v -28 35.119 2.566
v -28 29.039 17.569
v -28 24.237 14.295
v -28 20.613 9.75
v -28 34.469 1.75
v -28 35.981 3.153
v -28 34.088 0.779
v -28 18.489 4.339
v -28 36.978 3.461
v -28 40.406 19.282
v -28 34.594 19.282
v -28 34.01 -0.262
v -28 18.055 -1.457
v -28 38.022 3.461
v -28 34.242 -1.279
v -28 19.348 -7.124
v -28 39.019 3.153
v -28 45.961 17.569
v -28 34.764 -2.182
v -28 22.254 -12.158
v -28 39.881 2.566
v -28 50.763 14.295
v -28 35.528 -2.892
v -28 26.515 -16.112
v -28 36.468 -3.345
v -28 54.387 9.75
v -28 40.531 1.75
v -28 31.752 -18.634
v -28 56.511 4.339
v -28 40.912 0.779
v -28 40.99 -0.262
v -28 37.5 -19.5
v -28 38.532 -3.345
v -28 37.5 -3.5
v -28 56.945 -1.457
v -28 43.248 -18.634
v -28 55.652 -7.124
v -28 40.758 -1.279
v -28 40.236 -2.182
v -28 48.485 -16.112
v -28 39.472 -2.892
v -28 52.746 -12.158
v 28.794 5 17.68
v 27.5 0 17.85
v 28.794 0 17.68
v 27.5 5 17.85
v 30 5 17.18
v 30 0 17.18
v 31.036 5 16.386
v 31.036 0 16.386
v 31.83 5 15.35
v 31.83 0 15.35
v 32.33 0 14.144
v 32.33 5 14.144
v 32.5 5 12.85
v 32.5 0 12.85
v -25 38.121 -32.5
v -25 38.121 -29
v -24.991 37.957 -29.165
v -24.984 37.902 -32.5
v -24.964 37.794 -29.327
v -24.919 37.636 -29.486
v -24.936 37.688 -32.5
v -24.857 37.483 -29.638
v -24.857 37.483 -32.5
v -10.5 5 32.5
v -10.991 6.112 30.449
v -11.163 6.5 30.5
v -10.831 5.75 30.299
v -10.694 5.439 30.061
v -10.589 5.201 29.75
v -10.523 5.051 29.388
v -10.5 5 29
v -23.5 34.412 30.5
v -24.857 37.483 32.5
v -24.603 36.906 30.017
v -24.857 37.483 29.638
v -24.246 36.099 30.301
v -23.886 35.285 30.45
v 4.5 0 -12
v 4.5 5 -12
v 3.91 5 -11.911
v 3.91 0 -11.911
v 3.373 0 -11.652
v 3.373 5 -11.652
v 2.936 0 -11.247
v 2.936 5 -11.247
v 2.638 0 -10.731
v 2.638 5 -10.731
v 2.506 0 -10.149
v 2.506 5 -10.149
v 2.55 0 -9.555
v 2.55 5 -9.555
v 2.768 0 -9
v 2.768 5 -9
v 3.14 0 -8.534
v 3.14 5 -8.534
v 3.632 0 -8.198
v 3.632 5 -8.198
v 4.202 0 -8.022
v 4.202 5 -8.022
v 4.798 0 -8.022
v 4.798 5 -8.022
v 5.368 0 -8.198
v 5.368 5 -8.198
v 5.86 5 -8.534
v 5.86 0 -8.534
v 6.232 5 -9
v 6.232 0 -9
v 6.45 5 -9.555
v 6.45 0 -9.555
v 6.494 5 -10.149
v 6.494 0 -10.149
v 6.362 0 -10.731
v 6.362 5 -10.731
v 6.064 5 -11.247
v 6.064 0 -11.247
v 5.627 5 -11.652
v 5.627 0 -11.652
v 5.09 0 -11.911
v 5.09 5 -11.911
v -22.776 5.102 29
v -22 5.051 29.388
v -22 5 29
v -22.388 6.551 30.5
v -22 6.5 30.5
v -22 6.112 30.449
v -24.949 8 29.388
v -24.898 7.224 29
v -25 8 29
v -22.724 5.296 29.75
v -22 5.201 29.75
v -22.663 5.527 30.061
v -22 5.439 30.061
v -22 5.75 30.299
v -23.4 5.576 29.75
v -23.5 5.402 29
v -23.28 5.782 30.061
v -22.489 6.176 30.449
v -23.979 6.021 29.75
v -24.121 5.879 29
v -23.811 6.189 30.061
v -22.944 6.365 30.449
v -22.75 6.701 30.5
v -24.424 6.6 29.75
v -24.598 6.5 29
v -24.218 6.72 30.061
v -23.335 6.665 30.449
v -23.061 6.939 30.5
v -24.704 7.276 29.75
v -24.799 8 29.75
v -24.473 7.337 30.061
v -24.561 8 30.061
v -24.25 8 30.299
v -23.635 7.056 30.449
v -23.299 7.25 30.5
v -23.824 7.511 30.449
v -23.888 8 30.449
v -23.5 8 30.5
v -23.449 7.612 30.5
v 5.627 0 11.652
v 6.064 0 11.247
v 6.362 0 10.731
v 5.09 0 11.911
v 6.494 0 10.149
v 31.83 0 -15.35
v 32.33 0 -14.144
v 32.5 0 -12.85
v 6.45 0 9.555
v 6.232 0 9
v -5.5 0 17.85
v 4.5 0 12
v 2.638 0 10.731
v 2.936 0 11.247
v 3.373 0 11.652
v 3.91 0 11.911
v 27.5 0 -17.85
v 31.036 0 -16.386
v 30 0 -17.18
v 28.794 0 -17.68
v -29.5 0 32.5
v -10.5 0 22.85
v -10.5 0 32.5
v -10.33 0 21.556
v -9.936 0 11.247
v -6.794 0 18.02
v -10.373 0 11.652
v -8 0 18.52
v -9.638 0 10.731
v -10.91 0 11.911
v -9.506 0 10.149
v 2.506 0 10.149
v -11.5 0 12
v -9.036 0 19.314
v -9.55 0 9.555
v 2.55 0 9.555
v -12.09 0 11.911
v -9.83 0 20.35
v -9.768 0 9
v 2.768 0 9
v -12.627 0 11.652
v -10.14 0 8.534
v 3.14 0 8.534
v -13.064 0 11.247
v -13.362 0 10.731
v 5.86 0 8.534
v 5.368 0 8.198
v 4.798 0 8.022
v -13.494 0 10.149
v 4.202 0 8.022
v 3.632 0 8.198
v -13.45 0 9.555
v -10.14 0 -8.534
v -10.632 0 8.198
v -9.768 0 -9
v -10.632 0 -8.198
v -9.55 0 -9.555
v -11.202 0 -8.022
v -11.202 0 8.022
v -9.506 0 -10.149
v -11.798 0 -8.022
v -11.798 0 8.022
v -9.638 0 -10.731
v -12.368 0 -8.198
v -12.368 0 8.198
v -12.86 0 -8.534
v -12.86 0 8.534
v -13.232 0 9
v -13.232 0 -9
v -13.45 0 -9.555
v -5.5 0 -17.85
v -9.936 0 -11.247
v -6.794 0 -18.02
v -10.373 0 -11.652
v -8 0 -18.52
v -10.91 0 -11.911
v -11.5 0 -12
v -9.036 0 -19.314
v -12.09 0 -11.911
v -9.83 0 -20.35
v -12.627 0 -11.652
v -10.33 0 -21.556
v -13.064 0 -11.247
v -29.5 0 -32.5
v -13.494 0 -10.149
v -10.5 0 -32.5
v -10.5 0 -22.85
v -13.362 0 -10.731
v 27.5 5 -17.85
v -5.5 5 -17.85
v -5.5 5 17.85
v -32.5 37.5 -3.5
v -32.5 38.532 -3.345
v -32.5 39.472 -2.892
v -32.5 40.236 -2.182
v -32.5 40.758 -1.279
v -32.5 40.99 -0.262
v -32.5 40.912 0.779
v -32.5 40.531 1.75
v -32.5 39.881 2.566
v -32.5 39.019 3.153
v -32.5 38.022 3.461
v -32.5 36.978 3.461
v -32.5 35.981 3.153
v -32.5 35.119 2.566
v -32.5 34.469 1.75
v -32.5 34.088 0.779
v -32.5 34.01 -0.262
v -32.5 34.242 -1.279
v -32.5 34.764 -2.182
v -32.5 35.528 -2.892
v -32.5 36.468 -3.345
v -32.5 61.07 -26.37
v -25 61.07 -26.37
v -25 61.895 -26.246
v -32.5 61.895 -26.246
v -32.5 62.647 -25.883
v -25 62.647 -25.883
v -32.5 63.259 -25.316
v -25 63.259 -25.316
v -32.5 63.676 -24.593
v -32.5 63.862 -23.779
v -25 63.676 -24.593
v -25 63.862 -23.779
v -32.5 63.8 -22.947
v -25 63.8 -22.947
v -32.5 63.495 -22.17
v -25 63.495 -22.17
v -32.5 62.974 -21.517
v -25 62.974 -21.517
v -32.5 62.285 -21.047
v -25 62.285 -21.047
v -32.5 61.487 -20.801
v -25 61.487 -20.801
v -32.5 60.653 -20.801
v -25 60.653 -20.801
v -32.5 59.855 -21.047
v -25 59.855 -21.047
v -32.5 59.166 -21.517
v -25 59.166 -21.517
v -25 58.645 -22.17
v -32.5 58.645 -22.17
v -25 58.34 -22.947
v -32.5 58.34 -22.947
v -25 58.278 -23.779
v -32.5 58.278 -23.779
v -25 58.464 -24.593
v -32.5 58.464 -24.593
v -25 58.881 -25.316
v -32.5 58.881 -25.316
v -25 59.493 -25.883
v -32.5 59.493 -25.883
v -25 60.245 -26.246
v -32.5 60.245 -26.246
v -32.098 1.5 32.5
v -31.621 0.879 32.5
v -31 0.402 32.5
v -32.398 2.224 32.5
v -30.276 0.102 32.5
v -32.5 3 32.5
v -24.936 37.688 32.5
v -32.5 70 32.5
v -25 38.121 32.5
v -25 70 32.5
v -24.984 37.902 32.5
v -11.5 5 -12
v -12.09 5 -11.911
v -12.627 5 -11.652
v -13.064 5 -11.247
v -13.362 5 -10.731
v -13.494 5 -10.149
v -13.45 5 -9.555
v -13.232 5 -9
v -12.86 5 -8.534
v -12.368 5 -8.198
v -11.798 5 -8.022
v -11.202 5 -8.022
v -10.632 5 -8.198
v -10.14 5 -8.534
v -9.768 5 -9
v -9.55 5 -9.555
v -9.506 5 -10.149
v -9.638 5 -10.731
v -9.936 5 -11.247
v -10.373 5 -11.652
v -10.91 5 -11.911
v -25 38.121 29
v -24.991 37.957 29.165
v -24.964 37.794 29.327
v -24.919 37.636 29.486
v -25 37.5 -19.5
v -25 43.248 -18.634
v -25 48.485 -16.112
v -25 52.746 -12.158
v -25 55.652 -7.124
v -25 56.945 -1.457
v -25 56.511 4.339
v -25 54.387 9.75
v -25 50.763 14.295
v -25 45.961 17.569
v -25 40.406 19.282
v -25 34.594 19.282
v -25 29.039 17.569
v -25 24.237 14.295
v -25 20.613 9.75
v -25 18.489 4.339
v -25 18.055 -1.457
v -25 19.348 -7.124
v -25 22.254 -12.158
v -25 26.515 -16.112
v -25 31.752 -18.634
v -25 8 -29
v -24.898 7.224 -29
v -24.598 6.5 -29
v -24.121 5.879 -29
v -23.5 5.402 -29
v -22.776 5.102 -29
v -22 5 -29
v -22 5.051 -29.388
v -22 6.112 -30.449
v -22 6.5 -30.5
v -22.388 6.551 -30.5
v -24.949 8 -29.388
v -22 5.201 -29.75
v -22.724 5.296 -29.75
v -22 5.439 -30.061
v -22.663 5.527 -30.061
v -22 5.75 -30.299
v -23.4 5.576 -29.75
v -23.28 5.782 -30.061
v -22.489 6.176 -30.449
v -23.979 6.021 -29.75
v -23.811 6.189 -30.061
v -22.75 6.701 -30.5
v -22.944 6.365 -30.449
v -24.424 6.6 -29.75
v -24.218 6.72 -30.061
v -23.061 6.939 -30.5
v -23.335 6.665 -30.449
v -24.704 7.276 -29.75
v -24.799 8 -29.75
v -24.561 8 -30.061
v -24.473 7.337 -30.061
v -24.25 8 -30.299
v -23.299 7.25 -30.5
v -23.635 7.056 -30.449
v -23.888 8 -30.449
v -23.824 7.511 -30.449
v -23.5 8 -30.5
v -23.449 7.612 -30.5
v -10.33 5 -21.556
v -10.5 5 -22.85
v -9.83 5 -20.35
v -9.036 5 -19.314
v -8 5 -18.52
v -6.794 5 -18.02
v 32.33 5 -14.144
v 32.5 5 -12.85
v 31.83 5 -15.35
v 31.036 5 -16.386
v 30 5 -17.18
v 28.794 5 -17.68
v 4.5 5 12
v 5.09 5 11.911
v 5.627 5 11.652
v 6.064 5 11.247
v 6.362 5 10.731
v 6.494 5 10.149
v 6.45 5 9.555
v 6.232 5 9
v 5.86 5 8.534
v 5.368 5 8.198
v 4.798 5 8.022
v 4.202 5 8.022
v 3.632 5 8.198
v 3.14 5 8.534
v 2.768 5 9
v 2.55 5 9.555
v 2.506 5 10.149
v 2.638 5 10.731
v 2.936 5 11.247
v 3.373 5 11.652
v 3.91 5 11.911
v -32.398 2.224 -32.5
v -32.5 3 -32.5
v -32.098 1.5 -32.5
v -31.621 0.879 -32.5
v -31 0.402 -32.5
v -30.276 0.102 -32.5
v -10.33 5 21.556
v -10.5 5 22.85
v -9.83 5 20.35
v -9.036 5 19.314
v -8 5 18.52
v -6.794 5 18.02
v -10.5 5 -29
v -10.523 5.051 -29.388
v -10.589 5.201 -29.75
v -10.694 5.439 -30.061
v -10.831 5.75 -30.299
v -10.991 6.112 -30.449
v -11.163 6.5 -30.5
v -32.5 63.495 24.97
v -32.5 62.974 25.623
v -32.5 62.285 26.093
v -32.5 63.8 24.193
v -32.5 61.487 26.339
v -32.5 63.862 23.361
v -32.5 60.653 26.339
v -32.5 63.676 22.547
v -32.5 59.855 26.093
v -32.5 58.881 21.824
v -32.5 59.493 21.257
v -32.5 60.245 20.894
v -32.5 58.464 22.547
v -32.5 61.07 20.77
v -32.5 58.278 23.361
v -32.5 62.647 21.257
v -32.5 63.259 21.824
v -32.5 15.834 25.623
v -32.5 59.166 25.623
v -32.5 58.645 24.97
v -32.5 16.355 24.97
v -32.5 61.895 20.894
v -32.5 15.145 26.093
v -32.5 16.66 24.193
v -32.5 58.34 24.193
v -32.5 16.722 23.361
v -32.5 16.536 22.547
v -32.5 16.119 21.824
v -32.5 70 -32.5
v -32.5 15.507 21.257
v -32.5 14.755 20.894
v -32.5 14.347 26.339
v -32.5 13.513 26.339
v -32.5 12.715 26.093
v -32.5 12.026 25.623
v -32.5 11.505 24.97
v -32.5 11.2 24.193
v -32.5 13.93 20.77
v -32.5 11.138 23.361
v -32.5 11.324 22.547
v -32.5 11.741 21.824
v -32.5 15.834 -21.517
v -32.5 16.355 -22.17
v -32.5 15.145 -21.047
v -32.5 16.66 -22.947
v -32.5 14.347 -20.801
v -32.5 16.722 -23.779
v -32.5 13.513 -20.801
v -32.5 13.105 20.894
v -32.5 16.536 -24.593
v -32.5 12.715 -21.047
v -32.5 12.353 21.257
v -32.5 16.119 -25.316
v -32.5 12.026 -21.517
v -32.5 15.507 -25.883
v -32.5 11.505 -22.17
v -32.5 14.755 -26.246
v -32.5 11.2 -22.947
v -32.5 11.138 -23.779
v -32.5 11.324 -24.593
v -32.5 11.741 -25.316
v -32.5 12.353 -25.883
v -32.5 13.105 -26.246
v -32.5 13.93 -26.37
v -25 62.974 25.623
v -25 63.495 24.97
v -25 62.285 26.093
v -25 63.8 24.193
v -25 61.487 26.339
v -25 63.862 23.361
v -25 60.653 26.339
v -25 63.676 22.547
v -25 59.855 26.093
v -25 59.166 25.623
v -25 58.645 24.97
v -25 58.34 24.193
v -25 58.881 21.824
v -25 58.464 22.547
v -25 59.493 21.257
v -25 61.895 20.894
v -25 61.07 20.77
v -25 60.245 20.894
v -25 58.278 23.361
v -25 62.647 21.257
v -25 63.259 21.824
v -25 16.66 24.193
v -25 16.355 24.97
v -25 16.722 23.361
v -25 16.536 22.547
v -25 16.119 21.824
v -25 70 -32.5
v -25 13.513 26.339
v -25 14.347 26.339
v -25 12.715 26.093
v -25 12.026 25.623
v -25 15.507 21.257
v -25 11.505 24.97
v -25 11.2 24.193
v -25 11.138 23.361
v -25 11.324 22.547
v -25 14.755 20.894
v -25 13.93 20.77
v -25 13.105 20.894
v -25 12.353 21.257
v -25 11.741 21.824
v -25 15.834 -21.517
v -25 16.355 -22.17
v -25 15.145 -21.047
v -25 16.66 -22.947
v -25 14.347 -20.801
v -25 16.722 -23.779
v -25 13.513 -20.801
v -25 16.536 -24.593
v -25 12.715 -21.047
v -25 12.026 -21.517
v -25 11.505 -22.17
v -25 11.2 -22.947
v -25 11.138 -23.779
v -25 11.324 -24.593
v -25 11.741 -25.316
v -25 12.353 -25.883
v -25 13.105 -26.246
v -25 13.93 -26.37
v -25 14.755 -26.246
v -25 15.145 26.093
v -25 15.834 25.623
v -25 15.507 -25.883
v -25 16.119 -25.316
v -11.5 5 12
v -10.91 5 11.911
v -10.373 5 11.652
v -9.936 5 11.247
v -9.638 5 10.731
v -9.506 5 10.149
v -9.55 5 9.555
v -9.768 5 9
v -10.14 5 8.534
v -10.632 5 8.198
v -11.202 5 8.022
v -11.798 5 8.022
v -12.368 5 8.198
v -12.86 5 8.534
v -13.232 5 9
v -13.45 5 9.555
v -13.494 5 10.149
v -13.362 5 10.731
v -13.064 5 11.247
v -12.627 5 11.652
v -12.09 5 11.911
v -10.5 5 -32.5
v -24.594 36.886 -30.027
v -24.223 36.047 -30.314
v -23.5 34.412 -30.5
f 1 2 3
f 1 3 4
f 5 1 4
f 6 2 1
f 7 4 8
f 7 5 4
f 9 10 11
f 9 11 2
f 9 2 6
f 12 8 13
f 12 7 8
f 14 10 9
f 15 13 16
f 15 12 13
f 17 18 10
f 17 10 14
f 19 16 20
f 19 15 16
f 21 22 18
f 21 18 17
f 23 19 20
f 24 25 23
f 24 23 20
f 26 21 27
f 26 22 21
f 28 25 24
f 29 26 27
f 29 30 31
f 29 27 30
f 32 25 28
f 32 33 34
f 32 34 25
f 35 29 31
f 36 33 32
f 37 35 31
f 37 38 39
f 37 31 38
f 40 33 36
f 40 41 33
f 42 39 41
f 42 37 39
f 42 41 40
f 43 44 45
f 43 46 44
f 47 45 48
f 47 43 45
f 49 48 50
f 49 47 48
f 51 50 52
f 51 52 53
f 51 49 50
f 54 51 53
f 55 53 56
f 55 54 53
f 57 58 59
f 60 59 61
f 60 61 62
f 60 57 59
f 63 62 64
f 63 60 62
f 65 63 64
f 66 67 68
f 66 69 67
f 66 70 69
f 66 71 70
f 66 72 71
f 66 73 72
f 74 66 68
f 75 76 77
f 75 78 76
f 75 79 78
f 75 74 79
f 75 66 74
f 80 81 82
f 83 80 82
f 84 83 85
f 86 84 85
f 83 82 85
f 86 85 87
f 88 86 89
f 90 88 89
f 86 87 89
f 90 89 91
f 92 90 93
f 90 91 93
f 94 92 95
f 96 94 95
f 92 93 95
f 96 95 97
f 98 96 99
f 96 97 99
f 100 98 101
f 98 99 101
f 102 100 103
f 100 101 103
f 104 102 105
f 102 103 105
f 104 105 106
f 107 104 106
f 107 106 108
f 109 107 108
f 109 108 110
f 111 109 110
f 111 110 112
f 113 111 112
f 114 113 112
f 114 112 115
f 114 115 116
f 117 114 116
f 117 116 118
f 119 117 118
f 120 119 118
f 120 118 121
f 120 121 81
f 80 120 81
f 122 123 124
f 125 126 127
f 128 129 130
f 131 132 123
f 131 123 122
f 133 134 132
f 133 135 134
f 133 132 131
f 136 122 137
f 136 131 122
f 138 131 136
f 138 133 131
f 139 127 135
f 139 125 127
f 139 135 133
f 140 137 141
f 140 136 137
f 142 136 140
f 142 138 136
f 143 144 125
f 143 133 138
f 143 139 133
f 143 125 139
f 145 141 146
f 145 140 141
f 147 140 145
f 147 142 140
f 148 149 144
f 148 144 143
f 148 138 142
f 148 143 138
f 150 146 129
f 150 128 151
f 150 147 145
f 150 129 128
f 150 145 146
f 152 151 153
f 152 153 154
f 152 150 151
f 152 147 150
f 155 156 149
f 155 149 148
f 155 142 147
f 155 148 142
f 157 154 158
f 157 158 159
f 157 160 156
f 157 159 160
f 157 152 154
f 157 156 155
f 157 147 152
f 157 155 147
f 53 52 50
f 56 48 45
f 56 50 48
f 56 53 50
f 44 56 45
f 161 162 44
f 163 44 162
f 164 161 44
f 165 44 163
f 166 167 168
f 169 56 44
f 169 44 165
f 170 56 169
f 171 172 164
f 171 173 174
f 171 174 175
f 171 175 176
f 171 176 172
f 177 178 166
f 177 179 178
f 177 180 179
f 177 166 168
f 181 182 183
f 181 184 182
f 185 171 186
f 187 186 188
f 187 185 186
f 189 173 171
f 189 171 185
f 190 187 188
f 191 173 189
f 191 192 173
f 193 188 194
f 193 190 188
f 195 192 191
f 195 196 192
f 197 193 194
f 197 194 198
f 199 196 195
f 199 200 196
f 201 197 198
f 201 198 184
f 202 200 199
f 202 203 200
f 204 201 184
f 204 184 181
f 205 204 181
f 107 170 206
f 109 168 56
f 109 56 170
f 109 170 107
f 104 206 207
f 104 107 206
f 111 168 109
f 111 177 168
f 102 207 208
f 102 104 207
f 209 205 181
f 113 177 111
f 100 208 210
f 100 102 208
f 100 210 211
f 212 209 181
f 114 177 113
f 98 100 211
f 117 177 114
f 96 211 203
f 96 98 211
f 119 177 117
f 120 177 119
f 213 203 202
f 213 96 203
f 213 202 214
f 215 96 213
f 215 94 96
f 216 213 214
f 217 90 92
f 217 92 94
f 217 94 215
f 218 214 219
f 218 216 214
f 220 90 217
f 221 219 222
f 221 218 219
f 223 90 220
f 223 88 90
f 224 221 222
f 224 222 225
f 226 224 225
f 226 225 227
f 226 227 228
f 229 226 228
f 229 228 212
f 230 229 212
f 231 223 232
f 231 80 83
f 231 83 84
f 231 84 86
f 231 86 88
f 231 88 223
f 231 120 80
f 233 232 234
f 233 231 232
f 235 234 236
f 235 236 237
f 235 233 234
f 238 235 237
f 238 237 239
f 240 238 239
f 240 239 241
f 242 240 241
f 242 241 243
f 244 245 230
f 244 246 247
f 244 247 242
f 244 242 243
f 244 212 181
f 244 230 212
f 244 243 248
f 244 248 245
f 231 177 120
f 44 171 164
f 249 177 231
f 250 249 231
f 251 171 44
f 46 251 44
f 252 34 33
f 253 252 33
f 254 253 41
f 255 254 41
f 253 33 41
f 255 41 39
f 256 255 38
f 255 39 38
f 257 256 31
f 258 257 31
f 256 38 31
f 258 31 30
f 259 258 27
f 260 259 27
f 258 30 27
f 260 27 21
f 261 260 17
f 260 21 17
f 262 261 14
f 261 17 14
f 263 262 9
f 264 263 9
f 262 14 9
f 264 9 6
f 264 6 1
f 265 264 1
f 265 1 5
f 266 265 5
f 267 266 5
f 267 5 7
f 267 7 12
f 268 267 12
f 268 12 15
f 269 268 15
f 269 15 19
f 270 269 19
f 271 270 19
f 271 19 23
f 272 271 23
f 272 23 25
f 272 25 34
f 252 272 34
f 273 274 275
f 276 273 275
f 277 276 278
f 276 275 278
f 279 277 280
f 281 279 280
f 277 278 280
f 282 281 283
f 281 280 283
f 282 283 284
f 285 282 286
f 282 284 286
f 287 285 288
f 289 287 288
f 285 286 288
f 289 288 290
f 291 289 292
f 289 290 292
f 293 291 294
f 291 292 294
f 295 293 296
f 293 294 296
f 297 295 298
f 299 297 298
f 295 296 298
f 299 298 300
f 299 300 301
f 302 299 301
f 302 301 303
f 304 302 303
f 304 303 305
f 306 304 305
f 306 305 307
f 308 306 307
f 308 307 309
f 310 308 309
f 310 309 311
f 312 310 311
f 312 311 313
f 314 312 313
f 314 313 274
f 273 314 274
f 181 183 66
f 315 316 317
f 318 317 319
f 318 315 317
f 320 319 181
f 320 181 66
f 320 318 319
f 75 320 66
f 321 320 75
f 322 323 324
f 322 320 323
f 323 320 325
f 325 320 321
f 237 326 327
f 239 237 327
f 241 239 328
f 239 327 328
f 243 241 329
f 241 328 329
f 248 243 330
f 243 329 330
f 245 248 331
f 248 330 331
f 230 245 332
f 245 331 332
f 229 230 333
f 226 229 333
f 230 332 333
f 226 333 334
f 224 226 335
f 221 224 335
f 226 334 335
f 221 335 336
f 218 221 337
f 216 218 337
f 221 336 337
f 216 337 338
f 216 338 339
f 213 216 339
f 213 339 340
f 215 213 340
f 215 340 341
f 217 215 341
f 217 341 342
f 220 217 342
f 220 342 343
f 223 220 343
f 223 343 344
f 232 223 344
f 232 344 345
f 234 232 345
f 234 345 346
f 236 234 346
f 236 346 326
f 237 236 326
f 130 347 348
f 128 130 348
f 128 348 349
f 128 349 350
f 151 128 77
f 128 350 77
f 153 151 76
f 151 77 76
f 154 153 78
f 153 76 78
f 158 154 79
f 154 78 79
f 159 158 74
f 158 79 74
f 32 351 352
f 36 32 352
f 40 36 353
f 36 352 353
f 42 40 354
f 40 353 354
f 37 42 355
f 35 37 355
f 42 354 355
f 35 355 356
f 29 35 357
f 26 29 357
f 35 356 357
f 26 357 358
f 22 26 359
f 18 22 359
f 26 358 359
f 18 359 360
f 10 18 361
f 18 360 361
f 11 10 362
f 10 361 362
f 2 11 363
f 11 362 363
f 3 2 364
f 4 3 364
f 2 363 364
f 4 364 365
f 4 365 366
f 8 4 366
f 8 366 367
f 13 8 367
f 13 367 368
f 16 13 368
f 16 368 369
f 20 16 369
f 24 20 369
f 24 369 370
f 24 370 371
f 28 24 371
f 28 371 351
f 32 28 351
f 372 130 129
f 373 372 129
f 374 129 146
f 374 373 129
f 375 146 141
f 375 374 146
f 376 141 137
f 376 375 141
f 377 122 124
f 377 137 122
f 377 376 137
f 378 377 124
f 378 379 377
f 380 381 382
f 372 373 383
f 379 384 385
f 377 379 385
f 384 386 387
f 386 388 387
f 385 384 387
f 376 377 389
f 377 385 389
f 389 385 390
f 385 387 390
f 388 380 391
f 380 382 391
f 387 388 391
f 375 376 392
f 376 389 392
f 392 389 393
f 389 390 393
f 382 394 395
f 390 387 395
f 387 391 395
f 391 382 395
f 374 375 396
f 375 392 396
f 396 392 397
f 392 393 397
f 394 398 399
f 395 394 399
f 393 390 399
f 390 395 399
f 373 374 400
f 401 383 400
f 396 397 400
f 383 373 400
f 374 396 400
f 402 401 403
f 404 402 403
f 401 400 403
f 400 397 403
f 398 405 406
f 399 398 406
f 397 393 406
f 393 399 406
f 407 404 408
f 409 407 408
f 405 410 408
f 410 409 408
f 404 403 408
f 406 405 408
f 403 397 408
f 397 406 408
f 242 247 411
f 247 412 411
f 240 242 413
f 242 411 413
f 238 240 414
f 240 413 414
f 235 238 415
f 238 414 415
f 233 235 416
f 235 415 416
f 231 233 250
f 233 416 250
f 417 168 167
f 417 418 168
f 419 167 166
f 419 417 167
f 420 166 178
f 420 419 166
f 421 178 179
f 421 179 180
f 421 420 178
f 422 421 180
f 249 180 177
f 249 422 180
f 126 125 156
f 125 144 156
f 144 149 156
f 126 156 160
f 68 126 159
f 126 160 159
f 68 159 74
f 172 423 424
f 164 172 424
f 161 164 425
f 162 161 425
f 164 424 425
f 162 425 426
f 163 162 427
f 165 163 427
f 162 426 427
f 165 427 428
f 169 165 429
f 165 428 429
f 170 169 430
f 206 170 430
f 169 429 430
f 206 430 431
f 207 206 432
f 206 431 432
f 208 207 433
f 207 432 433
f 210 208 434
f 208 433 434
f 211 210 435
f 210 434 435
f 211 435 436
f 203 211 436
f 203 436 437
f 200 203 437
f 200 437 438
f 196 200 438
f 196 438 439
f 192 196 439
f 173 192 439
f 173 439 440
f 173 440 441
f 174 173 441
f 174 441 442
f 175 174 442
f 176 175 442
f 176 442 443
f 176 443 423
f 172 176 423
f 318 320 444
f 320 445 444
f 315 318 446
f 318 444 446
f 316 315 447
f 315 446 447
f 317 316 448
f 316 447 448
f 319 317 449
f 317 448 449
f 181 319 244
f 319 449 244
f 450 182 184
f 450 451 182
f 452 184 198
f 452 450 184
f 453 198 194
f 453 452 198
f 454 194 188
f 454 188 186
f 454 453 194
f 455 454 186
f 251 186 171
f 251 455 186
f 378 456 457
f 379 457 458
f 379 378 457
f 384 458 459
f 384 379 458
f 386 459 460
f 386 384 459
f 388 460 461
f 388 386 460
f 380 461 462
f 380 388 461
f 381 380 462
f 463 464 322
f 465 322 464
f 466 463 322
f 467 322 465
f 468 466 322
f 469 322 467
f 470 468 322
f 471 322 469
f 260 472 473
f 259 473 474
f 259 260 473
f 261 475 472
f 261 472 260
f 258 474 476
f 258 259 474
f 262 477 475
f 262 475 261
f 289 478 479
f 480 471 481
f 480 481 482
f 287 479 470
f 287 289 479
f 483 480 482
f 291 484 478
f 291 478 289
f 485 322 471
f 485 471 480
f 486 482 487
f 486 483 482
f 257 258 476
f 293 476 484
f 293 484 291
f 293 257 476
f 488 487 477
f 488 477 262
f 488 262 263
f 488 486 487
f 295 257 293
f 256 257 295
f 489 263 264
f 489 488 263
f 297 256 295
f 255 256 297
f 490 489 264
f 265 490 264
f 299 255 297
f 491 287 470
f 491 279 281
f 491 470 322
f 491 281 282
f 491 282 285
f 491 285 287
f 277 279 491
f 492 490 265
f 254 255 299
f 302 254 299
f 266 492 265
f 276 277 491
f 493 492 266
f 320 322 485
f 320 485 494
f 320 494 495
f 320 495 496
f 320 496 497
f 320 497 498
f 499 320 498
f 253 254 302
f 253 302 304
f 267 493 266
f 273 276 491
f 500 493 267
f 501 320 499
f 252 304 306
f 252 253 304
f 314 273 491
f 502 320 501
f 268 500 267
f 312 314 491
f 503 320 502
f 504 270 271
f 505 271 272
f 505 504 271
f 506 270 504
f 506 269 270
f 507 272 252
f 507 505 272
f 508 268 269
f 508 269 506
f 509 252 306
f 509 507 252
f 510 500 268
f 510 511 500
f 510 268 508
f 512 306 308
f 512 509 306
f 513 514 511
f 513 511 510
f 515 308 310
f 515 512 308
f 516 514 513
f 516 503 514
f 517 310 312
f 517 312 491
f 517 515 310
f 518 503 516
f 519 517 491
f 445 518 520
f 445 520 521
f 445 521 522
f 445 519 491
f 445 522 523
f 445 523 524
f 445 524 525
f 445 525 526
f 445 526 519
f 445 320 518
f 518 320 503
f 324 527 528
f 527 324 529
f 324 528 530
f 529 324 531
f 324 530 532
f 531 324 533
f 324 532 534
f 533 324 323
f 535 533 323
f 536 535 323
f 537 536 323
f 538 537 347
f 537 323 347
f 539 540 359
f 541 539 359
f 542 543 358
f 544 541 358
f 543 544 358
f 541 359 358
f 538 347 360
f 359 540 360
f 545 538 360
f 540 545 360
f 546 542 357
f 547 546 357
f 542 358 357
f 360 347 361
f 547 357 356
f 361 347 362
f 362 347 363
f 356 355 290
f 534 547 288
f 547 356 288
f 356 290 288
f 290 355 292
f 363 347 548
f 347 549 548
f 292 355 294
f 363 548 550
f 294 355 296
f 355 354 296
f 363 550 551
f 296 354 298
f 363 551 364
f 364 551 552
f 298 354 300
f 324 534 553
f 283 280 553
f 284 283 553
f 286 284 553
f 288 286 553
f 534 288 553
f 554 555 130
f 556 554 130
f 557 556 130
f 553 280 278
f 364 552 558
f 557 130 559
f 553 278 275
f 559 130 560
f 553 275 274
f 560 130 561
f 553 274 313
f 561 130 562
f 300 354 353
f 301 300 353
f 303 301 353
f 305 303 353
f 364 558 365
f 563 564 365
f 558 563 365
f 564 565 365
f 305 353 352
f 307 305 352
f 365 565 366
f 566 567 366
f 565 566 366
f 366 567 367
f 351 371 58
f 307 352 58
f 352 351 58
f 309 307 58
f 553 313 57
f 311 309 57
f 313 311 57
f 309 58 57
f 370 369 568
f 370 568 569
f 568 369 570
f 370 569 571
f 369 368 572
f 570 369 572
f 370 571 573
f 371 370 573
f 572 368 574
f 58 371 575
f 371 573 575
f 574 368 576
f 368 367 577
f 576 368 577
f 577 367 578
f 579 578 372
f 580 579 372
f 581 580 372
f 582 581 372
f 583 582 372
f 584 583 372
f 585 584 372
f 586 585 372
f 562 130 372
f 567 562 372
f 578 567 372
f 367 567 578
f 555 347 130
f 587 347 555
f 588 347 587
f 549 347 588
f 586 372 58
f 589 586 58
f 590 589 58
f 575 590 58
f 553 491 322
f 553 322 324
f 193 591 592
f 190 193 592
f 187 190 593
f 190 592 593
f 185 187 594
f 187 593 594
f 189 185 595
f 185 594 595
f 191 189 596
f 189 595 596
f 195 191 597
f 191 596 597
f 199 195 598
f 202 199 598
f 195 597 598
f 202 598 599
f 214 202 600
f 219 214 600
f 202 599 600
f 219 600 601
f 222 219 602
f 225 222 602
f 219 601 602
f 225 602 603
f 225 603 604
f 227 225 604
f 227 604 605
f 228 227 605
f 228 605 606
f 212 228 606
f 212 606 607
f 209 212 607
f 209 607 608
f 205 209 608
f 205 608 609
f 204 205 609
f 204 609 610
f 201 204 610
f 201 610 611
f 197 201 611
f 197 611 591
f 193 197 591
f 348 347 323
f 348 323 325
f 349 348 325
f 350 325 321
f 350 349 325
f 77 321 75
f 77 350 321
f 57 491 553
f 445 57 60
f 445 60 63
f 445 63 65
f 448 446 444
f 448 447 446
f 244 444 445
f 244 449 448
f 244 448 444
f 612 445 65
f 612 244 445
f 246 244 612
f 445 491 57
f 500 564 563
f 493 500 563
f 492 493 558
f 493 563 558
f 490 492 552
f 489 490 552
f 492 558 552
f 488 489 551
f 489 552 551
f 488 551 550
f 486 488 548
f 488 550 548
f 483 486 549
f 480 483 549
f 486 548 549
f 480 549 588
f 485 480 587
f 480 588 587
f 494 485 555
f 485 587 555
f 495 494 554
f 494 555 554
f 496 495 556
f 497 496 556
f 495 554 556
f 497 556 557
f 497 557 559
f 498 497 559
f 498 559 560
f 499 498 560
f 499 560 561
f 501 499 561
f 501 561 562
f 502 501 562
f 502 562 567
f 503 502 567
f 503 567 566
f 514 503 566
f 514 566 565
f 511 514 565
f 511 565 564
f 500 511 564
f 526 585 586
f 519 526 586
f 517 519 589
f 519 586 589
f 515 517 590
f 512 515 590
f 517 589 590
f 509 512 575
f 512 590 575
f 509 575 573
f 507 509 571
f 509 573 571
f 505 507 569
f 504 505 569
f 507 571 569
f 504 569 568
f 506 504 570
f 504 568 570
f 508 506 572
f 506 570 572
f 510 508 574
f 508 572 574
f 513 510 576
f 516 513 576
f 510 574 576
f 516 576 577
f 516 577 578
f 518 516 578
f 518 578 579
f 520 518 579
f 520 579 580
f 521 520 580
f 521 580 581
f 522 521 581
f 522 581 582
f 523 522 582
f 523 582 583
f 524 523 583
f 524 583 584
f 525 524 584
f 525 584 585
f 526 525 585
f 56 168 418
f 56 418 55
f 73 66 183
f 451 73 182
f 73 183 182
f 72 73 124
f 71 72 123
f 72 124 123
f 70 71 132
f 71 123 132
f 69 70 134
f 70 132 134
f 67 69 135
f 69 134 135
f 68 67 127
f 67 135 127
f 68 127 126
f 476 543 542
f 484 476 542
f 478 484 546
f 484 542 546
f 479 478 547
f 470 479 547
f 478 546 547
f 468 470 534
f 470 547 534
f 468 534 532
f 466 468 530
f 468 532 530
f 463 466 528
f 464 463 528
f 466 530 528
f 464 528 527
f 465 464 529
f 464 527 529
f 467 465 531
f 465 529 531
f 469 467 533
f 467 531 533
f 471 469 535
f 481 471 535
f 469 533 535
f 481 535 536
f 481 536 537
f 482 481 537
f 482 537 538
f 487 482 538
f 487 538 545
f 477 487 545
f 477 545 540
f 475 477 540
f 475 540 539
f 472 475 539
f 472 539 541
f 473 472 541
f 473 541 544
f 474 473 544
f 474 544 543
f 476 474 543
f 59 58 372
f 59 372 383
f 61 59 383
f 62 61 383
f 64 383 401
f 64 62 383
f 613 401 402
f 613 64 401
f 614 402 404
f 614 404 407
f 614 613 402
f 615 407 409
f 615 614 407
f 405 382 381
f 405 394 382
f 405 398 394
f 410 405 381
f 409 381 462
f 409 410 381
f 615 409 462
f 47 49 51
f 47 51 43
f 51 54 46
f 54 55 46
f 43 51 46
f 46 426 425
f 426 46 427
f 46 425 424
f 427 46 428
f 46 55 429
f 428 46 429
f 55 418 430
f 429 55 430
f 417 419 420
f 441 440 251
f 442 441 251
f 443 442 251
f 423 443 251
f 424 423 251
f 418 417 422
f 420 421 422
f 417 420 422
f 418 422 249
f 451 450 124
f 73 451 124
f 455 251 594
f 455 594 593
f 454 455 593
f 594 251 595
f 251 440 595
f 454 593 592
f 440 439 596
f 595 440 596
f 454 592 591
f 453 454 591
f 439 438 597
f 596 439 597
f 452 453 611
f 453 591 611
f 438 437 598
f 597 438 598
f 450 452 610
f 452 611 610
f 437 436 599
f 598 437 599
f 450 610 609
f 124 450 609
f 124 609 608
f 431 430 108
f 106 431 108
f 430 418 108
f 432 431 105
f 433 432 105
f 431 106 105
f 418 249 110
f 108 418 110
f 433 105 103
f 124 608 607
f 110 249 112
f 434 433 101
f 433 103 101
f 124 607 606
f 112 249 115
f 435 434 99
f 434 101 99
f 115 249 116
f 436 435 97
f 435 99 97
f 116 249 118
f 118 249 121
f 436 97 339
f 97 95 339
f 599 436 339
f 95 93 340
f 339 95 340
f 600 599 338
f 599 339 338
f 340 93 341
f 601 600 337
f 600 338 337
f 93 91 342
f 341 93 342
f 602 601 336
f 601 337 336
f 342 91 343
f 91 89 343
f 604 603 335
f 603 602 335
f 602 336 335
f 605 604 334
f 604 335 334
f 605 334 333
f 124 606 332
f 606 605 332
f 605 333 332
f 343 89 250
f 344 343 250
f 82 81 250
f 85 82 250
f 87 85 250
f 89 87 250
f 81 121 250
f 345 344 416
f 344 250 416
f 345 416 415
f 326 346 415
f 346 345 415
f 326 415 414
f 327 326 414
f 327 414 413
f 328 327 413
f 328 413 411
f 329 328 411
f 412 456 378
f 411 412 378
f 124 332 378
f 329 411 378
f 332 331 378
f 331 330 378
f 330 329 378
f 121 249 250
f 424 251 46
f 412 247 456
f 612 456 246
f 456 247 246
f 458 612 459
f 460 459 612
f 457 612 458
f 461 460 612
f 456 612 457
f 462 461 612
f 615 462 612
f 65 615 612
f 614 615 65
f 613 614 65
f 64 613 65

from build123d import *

# Parameters (mm, degrees)
BOSS_EXTRUDE1_DEPTH     = 5
SKETCH2_W               = 7.5
SKETCH2_H               = 65
BOSS_EXTRUDE2_DEPTH     = 65
FILLET2_R               = 3
SKETCH4_R               = 2.8
SKETCH4_R_2             = 3.5
CUT_EXTRUDE2_DEPTH      = 97.241882775
SKETCH6_R               = 2
CUT_EXTRUDE3_DEPTH      = 80.60841664
SKETCH7_R               = 19.5
CUT_EXTRUDE4_DEPTH      = 3
SKETCH8_W               = 2
SKETCH8_H               = 32.5
BOSS_EXTRUDE3_DEPTH     = 32.5
CUT_EXTRUDE5_DEPTH      = 101.902180353
FILLET3_R               = 3
FILLET4_R               = 1.5
CUT_EXTRUDE6_DEPTH      = 5
FILLET5_R               = 5
CUT_EXTRUDE7_DEPTH      = 101.902180353
CUT_EXTRUDE7_DEPTH_BACK = 101.902180353


with BuildPart() as part:
    # Sketch1 → Boss-Extrude1 (new body)
    with BuildSketch(Plane(origin=(0, 0, 0), x_dir=(1, 0, 0), z_dir=(0, 1, 0))):
        with BuildLine():
            Line((-32.5, 32.5), (27.5, 32.5))
            ThreePointArc((27.5, 32.5), (31.035533906, 31.035533906), (32.5, 27.5))
            Line((32.5, 27.5), (32.5, -27.5))
            ThreePointArc((32.5, -27.5), (31.035533906, -31.035533906), (27.5, -32.5))
            Line((27.5, -32.5), (-32.5, -32.5))
            Line((-32.5, -32.5), (-32.5, 32.5))
        make_face()
    extrude(amount=BOSS_EXTRUDE1_DEPTH)

    # Sketch2 → Boss-Extrude2 (add)
    with BuildSketch(Plane(origin=(0, 5, 0), x_dir=(1, 0, 0), z_dir=(0, 1, 0))):
        with Locations((-28.75, 0)):
            Rectangle(SKETCH2_W, SKETCH2_H)
    extrude(amount=BOSS_EXTRUDE2_DEPTH)

    # Fillet2
    fillet2_edges = [part.edges().sort_by_distance(p)[0] for p in [
        (-32.5, 0, 0),
    ]]
    fillet(fillet2_edges, radius=FILLET2_R)

    # Sketch4 → Cut-Extrude2 (cut, through all)
    with BuildSketch(Plane(origin=(-25, 0, 0), x_dir=(0, 0, -1), z_dir=(1, 0, 0))):
        with Locations((23.57, 61.07)):
            Circle(SKETCH4_R)
        with Locations((-23.57, 61.07)):
            Circle(SKETCH4_R)
        with Locations((-23.57, 13.93)):
            Circle(SKETCH4_R)
        with Locations((23.57, 13.93)):
            Circle(SKETCH4_R)
        with Locations((0, 37.5)):
            Circle(SKETCH4_R_2)
    extrude(amount=-CUT_EXTRUDE2_DEPTH, mode=Mode.SUBTRACT)

    # Sketch6 → Cut-Extrude3 (cut, through all)
    with BuildSketch(Plane(origin=(0, 5, 0), x_dir=(1, 0, 0), z_dir=(0, 1, 0))):
        with Locations(Location((4.5, -10, 0), (0, 0, 270))):
            Circle(SKETCH6_R)
        with Locations(Location((-11.5, -10, 0), (0, 0, 270))):
            Circle(SKETCH6_R)
        with Locations(Location((4.5, 10, 0), (0, 0, 90))):
            Circle(SKETCH6_R)
        with Locations(Location((-11.5, 10, 0), (0, 0, 90))):
            Circle(SKETCH6_R)
    extrude(amount=-CUT_EXTRUDE3_DEPTH, mode=Mode.SUBTRACT)

    # Sketch7 → Cut-Extrude4 (cut)
    with BuildSketch(Plane(origin=(-25, 0, 0), x_dir=(0, 0, -1), z_dir=(1, 0, 0))):
        with Locations((0, 37.5)):
            Circle(SKETCH7_R)
    extrude(amount=-CUT_EXTRUDE4_DEPTH, mode=Mode.SUBTRACT)

    # Sketch8 → Boss-Extrude3 (add)
    with BuildSketch(Plane(origin=(-25, 0, 0), x_dir=(0, 0, -1), z_dir=(1, 0, 0))):
        with Locations((-31.5, 21.25)):
            Rectangle(SKETCH8_W, SKETCH8_H)
        with Locations((31.5, 21.25)):
            Rectangle(SKETCH8_W, SKETCH8_H)
    extrude(amount=BOSS_EXTRUDE3_DEPTH)

    # Sketch9 → Cut-Extrude5 (cut, through all)
    with BuildSketch(Plane.XY.offset(32.5)):
        Polygon((-25, 37.5), (7.5, 5), (7.5, 37.5), align=None)
    extrude(amount=-CUT_EXTRUDE5_DEPTH, mode=Mode.SUBTRACT)

    # Fillet3
    fillet3_edges = [part.edges().sort_by_distance(p)[0] for p in [
        (-25, 5, 0),
    ]]
    fillet(fillet3_edges, radius=FILLET3_R)

    # Fillet4
    fillet4_edges = [part.edges().sort_by_distance(p)[0] for p in [
        (-25, 37.5, -31.5),
        (-25, 22.75, -30.5),
        (-7.25, 5, -30.5),
        (7.5, 5, -31.5),
        (-25, 22.75, 30.5),
        (-24.121320344, 5.878679656, 30.5),
        (-24.121320344, 5.878679656, -30.5),
        (-7.25, 5, 30.5),
        (-25, 37.5, 31.5),
        (7.5, 5, 31.5),
    ]]
    fillet(fillet4_edges, radius=FILLET4_R)

    # Sketch10 → Cut-Extrude6 (cut)
    with BuildSketch(Plane.XZ):
        with BuildLine():
            Line((32.5, -17.85), (-10.5, -17.85))
            Line((-10.5, -17.85), (-10.5, -32.5))
            Line((-10.5, -32.5), (27.5, -32.5))
            ThreePointArc((27.5, -32.5), (31.035533906, -31.035533906), (32.5, -27.5))
            Line((32.5, -27.5), (32.5, -17.85))
        make_face()
        with BuildLine():
            Line((-10.5, 17.85), (32.5, 17.85))
            Line((32.5, 17.85), (32.5, 27.5))
            ThreePointArc((32.5, 27.5), (31.035533906, 31.035533906), (27.5, 32.5))
            Line((27.5, 32.5), (-10.5, 32.5))
            Line((-10.5, 32.5), (-10.5, 17.85))
        make_face()
    extrude(amount=-CUT_EXTRUDE6_DEPTH, mode=Mode.SUBTRACT)

    # Fillet5
    fillet5_edges = [part.edges().sort_by_distance(p)[0] for p in [
        (-10.5, 2.5, -17.85),
        (32.5, 2.5, -17.85),
        (-10.5, 2.5, 17.85),
        (32.5, 2.5, 17.85),
    ]]
    fillet(fillet5_edges, radius=FILLET5_R)

    # Sketch12 → Cut-Extrude7 (cut, two sides: drawn at the far end of the back side and taken through both)
    with BuildSketch(Plane(origin=(0, 0, -32.5), x_dir=(-1, 0, 0), z_dir=(0, 0, -1)).offset(-CUT_EXTRUDE7_DEPTH_BACK)):
        with BuildLine():
            Line((-8.121320344, 5), (10.5, 5))
            Line((10.5, 5), (24.857345269, 37.482873932))
            ThreePointArc((24.857345269, 37.482873932), (24.727295275, 37.258913069), (24.560660172, 37.060660172))
            Line((24.560660172, 37.060660172), (-7.060660172, 5.439339828))
            ThreePointArc((-7.060660172, 5.439339828), (-7.547295195, 5.114180701), (-8.121320344, 5))
        make_face()
    extrude(amount=CUT_EXTRUDE7_DEPTH + CUT_EXTRUDE7_DEPTH_BACK, mode=Mode.SUBTRACT)


solid = part.part
